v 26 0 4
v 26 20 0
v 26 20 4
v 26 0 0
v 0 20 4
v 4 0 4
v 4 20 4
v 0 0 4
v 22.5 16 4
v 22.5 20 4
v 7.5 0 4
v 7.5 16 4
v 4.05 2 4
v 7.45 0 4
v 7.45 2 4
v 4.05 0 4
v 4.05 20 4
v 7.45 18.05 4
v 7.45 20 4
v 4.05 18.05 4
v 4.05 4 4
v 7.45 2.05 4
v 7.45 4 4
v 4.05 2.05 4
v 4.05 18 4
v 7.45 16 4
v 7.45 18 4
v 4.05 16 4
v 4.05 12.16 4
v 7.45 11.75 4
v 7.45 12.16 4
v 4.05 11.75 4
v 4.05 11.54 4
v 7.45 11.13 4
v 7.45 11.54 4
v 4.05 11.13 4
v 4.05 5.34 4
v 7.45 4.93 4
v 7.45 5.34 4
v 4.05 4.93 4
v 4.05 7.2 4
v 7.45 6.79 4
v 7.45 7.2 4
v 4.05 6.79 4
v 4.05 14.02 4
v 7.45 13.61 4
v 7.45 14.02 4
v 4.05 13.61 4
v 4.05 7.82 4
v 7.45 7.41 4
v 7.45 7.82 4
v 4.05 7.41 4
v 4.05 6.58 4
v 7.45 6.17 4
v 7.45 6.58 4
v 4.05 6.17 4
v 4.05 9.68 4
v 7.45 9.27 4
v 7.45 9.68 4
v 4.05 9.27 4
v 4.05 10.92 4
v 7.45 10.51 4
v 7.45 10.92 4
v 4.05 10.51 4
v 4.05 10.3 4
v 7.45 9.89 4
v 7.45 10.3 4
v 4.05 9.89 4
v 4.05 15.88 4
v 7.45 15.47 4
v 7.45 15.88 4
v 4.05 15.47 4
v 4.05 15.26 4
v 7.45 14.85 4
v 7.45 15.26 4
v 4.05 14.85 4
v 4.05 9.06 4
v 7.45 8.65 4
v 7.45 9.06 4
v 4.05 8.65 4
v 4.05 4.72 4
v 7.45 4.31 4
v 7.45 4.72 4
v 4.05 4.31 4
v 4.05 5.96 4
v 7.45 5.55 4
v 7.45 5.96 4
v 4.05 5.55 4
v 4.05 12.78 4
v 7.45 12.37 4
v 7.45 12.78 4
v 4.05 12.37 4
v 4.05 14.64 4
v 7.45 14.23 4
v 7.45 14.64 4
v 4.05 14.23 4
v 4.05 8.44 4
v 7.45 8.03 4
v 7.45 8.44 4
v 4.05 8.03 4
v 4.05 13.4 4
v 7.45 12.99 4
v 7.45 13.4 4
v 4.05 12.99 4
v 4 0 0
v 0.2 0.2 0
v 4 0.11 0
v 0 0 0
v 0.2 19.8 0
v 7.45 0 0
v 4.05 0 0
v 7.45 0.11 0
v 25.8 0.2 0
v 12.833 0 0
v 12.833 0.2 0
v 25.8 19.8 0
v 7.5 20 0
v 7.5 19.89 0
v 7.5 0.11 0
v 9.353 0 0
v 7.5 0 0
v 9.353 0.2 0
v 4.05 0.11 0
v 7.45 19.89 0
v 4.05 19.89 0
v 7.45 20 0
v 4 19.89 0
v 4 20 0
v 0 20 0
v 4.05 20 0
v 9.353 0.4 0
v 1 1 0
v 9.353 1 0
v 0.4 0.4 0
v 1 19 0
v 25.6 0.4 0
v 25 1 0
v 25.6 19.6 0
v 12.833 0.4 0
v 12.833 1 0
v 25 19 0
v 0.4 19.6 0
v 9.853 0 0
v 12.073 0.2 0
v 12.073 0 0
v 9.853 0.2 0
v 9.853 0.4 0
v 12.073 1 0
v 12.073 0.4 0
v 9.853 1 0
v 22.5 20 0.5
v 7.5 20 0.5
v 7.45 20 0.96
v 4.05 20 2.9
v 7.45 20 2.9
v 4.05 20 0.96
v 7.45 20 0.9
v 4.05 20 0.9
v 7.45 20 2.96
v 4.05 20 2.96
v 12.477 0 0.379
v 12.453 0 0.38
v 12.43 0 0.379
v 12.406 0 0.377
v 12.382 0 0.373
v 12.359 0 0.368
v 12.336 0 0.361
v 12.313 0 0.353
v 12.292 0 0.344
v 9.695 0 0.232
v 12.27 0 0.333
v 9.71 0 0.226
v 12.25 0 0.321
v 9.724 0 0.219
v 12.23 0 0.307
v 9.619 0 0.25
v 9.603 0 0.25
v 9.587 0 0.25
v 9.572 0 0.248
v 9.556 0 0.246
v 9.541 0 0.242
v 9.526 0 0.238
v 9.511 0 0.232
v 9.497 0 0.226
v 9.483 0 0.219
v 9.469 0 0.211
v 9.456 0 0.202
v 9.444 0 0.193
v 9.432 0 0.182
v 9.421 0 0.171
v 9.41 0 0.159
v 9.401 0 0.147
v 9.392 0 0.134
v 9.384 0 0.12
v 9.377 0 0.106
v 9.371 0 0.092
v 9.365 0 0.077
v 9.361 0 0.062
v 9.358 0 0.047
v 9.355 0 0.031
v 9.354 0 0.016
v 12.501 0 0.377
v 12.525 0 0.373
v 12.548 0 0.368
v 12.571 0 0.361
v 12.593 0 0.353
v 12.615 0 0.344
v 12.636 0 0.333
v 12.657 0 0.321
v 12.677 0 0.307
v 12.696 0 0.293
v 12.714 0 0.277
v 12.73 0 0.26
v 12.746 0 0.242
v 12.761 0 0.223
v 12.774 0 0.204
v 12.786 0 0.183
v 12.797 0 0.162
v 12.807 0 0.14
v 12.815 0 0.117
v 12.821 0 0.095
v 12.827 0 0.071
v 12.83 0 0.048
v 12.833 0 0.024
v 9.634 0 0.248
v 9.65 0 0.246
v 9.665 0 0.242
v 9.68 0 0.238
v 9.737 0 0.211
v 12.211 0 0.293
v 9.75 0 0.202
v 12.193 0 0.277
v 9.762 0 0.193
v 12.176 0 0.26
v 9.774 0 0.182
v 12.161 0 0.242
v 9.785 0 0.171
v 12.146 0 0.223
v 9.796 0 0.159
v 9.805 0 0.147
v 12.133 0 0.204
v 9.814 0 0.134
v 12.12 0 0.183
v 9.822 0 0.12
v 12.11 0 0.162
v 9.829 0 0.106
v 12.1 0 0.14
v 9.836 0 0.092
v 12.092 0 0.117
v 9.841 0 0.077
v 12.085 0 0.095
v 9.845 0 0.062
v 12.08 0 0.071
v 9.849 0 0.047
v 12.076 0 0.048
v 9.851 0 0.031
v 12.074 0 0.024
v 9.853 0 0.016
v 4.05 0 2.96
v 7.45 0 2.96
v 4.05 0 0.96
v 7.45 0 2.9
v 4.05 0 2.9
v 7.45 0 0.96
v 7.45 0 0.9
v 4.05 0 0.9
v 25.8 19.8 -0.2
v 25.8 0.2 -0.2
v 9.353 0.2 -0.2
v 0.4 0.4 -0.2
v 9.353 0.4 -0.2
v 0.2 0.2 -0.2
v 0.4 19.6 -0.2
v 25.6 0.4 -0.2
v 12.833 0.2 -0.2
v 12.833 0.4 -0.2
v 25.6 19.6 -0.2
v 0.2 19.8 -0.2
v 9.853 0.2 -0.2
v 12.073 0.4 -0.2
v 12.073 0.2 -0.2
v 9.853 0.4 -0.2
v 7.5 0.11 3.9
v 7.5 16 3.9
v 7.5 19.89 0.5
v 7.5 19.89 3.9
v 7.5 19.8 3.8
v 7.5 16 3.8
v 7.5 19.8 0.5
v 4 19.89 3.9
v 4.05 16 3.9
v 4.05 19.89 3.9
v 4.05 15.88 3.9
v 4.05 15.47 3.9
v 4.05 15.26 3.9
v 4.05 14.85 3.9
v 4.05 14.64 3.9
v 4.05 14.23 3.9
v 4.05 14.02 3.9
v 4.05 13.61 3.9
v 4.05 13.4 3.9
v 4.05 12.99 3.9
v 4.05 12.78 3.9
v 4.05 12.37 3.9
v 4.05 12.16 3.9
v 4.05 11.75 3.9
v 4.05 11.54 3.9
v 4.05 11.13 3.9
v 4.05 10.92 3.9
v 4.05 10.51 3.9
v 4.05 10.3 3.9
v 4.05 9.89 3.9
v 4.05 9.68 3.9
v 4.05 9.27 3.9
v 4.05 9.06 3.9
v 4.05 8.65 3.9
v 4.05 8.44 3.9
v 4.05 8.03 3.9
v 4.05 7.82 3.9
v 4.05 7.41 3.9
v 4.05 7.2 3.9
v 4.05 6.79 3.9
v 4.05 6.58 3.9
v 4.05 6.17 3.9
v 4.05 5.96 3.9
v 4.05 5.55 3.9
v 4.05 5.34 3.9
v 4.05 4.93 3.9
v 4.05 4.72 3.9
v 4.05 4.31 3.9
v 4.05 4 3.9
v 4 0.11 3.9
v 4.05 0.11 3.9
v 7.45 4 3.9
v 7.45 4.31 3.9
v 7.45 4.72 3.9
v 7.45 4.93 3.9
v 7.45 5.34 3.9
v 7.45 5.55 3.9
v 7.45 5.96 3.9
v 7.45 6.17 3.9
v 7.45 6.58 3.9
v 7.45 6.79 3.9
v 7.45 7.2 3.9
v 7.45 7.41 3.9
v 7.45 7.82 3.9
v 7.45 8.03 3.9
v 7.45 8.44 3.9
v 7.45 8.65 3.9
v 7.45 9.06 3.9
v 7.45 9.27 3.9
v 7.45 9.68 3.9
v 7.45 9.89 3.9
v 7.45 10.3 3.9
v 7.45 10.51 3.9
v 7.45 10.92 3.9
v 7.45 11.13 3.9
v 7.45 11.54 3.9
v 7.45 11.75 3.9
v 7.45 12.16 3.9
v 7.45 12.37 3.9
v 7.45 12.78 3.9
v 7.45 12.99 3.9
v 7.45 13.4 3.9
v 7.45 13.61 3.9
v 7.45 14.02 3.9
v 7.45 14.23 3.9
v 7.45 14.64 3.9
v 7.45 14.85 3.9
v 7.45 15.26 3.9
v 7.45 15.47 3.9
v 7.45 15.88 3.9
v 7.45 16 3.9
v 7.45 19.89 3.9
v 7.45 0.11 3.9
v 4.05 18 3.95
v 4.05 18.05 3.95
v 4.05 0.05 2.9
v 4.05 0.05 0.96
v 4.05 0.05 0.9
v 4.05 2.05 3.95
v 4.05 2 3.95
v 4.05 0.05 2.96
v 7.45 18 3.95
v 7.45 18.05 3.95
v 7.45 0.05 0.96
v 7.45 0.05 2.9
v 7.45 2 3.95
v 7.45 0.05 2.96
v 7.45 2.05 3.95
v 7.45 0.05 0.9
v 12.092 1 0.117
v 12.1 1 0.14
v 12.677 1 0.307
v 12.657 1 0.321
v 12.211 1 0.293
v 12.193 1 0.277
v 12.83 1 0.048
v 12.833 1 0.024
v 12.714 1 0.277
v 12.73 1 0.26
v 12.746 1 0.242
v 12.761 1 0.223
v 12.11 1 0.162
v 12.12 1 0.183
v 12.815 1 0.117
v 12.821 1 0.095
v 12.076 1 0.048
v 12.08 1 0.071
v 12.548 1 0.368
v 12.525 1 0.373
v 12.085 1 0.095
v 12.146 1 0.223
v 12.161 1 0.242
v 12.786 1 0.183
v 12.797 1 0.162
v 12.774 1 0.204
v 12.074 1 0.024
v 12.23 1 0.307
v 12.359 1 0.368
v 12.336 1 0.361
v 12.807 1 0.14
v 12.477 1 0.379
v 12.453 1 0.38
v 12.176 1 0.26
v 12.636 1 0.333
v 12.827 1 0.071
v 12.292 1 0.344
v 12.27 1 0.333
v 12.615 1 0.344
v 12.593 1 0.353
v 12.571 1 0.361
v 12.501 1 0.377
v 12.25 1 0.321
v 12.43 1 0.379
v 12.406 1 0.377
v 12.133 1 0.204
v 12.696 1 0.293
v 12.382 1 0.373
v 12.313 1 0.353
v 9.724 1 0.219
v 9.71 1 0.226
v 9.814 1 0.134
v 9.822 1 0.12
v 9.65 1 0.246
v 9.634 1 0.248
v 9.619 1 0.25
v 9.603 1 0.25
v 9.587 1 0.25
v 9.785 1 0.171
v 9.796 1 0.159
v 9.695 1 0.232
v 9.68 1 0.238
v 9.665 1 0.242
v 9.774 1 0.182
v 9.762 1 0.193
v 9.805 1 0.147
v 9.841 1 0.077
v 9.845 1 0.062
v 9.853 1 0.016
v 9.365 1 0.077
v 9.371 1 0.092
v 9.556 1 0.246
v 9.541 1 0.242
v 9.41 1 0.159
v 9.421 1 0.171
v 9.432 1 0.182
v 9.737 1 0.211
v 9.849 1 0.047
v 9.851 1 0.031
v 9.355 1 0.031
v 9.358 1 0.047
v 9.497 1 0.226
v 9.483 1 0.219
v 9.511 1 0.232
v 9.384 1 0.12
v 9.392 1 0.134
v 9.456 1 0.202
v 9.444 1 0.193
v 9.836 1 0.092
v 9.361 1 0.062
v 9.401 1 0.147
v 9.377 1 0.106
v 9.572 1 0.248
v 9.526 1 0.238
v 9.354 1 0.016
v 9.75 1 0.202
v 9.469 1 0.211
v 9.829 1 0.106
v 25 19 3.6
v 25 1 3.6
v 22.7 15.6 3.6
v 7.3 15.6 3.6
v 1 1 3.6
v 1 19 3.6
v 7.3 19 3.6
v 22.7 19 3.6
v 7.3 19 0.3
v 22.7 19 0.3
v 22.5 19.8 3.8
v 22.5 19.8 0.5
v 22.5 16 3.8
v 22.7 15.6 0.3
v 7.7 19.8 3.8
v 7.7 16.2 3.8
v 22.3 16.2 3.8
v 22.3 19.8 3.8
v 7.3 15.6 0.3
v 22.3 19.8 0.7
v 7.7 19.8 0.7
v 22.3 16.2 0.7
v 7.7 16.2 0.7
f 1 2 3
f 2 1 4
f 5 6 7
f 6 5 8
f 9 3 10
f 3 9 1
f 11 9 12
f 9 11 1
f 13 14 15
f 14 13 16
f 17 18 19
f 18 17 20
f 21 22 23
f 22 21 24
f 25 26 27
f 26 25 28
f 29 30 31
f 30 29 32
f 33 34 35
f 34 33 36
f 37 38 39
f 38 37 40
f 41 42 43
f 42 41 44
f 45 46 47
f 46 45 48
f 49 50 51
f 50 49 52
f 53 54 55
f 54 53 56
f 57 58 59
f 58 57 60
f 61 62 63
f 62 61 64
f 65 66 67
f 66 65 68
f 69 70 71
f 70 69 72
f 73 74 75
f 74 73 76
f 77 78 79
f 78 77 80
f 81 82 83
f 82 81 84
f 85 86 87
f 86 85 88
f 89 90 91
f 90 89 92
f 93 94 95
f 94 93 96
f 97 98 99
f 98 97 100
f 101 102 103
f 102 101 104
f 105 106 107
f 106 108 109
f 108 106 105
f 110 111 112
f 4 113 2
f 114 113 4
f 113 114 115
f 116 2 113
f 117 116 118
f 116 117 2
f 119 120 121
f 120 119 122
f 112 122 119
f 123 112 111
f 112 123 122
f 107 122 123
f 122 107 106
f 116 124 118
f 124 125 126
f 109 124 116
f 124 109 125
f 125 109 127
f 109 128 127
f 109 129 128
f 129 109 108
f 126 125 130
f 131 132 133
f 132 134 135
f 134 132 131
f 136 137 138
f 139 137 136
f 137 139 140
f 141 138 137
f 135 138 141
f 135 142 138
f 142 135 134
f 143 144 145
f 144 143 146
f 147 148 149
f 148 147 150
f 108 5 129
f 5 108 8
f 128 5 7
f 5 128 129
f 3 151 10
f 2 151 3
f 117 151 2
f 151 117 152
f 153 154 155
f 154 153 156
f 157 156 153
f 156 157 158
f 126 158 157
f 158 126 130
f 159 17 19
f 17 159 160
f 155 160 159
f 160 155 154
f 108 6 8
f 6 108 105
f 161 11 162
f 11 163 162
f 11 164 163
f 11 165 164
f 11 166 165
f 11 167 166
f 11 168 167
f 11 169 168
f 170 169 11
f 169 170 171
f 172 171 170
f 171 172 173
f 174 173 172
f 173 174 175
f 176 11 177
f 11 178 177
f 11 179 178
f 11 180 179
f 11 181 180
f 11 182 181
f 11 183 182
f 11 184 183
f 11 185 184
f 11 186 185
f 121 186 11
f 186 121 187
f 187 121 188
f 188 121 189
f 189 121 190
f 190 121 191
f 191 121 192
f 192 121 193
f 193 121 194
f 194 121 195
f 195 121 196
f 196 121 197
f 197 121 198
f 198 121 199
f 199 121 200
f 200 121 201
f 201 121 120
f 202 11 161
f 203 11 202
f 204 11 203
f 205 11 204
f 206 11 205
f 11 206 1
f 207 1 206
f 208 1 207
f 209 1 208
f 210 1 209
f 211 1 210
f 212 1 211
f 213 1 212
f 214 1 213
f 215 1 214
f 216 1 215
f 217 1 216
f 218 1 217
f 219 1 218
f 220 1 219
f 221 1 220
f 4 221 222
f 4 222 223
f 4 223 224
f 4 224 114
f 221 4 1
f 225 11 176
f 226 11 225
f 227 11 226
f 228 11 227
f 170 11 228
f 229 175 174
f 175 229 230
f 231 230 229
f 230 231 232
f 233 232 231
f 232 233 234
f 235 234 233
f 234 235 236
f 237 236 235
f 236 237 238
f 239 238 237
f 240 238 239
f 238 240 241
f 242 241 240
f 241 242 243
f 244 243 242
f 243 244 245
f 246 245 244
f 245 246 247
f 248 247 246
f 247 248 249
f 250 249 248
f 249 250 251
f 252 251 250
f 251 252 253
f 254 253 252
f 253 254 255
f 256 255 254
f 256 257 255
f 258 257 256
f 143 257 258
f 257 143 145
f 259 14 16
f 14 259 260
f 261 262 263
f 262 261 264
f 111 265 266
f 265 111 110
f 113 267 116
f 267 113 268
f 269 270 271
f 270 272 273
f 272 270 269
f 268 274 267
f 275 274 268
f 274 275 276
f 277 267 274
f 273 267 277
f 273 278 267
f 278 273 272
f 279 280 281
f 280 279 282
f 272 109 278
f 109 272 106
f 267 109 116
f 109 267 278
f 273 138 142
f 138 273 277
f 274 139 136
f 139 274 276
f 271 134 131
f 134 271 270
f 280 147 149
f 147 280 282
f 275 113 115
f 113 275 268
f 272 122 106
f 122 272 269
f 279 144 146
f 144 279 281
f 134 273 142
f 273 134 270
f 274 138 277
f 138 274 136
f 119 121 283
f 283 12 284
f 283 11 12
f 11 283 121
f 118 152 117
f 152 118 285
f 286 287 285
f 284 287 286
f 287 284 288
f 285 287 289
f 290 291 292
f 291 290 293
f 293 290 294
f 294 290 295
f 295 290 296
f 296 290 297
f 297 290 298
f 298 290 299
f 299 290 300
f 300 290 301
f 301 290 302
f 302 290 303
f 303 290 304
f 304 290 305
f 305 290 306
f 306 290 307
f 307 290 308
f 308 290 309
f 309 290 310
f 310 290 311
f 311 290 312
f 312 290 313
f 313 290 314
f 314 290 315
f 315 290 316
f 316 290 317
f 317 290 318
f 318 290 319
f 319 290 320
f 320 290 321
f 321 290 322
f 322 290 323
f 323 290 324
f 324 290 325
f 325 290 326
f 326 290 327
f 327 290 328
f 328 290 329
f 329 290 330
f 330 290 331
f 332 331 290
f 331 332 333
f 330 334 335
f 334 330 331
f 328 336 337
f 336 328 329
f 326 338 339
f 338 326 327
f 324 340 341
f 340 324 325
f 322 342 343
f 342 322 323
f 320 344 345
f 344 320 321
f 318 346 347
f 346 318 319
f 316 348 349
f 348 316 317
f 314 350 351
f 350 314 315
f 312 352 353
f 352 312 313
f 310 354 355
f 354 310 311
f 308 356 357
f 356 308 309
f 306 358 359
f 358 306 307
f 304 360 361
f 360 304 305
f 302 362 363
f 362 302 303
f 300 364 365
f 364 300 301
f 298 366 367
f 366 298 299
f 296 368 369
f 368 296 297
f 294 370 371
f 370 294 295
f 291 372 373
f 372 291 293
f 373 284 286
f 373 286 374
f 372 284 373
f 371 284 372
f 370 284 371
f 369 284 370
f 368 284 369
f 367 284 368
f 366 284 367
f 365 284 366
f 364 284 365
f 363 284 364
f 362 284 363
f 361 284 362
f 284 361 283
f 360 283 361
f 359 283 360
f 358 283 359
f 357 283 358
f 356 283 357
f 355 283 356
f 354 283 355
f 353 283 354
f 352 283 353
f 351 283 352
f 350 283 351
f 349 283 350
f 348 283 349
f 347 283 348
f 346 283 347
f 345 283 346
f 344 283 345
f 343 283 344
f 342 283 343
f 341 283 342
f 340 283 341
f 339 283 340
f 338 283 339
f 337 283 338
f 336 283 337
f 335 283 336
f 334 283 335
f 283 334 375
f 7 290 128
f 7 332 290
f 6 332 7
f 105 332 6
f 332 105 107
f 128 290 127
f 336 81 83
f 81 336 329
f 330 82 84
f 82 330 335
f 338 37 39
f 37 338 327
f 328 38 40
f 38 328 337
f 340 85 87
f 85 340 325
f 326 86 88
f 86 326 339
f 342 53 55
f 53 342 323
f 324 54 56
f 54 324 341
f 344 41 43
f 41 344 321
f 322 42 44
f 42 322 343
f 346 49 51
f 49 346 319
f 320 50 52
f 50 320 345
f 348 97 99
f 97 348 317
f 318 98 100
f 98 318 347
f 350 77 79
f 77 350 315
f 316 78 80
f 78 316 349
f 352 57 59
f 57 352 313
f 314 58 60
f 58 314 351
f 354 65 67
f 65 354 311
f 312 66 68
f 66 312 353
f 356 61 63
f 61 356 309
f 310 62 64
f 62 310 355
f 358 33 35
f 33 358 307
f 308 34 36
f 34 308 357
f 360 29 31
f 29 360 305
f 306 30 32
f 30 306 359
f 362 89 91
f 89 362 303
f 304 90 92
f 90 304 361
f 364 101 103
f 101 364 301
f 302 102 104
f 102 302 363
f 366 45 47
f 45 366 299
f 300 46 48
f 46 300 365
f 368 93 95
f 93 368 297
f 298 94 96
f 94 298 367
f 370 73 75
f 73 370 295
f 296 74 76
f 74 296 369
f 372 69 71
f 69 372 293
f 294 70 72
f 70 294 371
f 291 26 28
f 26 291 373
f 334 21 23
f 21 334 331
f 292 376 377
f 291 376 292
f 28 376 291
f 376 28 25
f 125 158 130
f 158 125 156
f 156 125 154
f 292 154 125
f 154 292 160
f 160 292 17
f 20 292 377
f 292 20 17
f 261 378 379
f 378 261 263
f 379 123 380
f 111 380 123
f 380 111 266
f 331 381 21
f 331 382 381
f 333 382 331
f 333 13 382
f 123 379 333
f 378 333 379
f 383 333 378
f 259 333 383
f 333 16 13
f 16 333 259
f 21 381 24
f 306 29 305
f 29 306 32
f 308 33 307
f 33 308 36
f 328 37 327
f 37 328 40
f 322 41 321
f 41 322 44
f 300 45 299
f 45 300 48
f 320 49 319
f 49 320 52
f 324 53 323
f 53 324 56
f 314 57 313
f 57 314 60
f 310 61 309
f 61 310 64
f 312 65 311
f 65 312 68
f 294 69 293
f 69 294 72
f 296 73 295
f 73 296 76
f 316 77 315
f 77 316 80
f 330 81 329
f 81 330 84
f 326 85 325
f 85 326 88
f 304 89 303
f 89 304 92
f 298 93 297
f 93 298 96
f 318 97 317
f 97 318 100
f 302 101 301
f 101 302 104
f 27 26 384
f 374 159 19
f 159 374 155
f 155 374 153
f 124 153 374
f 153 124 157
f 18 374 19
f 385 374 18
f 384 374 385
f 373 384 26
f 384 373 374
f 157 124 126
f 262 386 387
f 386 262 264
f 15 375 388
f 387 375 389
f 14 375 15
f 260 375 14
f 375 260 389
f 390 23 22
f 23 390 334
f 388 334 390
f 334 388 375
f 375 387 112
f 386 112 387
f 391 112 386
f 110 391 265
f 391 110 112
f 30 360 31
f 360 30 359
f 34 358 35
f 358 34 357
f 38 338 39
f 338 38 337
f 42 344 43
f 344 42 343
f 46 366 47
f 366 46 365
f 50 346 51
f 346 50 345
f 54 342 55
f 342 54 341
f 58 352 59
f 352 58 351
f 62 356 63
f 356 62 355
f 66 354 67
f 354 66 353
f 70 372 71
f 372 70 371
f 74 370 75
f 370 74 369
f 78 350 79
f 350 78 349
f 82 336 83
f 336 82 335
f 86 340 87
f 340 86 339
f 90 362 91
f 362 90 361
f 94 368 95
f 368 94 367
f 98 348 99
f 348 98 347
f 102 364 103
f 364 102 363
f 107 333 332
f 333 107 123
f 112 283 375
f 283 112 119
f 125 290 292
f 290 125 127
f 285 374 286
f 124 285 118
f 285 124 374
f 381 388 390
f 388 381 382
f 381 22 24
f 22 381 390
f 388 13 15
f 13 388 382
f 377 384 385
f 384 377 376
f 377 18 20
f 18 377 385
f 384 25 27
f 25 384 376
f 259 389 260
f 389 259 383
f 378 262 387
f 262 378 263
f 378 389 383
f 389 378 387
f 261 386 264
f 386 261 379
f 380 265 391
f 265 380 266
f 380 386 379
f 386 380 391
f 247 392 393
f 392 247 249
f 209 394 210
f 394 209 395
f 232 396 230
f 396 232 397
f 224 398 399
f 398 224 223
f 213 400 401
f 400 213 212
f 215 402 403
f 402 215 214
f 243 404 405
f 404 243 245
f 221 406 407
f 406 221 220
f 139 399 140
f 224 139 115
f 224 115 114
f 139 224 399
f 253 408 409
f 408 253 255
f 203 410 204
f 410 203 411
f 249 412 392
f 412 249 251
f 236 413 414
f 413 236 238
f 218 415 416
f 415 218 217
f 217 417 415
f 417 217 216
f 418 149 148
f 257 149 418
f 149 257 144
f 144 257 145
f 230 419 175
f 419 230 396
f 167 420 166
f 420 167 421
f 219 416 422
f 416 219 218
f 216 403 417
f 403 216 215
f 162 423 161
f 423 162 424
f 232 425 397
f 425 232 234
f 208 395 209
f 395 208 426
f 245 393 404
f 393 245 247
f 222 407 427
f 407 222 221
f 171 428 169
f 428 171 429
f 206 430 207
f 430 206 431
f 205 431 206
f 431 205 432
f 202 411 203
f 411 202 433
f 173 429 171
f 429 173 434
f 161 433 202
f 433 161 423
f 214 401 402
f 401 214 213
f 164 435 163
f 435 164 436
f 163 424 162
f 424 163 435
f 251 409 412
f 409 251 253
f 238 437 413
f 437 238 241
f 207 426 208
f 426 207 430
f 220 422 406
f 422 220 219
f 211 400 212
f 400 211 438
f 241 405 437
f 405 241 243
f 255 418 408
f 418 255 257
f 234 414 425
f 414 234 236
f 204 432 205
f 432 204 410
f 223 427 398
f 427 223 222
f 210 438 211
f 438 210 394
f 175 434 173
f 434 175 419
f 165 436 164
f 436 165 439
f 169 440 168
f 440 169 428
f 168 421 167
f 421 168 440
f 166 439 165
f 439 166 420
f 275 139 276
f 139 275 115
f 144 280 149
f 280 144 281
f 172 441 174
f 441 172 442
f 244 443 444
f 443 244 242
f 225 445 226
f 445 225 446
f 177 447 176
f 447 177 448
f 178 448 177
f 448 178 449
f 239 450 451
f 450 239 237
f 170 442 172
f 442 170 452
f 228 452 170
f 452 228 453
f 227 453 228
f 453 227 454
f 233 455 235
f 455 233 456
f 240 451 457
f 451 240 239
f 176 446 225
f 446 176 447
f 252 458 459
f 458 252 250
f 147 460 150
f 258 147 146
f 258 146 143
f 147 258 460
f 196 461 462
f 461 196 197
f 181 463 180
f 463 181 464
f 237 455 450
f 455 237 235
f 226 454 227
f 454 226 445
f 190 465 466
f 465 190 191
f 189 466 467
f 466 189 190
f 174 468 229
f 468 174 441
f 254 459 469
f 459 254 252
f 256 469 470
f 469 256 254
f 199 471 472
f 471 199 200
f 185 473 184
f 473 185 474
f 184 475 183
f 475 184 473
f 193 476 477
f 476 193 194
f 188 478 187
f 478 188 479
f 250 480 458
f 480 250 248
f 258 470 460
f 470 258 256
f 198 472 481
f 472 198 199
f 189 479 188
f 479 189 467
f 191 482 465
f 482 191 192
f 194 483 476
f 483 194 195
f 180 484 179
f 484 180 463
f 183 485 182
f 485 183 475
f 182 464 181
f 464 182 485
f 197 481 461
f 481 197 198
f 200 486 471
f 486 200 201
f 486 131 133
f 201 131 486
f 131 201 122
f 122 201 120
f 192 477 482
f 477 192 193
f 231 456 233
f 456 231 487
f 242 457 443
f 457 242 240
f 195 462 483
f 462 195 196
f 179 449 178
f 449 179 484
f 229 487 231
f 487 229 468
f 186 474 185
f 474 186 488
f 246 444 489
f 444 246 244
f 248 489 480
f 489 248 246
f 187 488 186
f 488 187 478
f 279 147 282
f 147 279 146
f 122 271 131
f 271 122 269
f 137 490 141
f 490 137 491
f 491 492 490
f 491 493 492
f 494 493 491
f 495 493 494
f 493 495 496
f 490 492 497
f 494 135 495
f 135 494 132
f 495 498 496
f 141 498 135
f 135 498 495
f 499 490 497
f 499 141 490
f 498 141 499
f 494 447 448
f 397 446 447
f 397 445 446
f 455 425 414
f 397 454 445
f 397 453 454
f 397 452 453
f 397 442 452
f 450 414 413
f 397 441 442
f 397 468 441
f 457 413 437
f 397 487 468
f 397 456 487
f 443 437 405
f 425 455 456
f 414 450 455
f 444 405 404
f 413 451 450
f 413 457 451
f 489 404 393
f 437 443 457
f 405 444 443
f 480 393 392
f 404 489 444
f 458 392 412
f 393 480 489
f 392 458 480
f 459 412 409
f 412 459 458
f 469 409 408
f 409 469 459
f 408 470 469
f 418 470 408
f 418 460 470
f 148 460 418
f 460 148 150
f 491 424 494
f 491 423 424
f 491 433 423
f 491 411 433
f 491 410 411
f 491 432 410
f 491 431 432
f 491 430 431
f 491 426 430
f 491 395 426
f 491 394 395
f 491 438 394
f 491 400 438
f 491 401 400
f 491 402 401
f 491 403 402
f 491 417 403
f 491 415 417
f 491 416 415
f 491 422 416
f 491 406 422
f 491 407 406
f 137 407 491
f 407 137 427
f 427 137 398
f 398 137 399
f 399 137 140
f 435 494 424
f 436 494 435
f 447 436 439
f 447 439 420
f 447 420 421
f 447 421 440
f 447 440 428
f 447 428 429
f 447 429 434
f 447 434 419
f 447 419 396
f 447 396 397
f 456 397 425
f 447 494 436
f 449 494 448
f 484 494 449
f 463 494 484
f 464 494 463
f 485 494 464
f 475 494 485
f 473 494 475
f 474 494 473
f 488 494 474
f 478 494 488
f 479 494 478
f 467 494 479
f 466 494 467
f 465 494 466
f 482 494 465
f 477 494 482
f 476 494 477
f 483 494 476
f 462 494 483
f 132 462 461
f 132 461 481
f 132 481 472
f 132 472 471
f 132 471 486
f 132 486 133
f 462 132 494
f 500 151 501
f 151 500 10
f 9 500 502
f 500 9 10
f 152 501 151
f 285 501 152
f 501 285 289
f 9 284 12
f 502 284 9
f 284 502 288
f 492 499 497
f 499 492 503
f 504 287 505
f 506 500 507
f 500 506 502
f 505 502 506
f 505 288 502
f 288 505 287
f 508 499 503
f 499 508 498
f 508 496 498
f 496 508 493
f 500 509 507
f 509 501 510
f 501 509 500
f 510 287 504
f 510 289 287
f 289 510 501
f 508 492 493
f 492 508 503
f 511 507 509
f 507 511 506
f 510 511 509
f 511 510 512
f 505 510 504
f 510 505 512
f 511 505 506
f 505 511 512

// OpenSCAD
$scale = 0.7508;

module nes_top(){
    difference(){
        union(){
            cube([26,20,4]);
            translate([0.2,19.6,-0.2]){
                cube([25.6,0.2,0.4]);
            }
            translate([0.2,0.2,-0.2]){
                cube([25.6,0.2,0.4]);
            }
            translate([0.2,0.4,-0.2]){
                cube([0.2,19.2,0.4]);
            }
            translate([25.6,0.4,-0.2]){
                cube([0.2,19.2,0.4]);
            }
        }
        translate([1,1,0]){
            cube([24,18,3.6]);
        }
        //translate([0.4,0.4,0]){
        //    cube([25.2,19.2,0.2]);
        //}
        translate([7.5,16,0.5]){
            cube([15,4,3.5]);
        }
        translate([4,4,3.9]){
            difference(){
                cube([3.5,12,0.11]);
                for(x = [0.31:0.62:12]){
                    translate([0,x,0]){
                        cube([3.5,0.41,0.11]);
                    }
                }
            }
            translate([0,-4,0]) cube([0.05,20,0.11]);
            translate([3.45,-4,0]) cube([0.05,20,0.11]);
            
            translate([0,-4,-4]) cube([0.05,0.11,4]);
            translate([3.45,-4,-4]) cube([0.05,0.11,4]);
            
            translate([0,15.89,-4]) cube([0.05,0.11,4]);
            translate([3.45,15.89,-4]) cube([0.05,0.11,4]);
            
            translate([0,-2,0.05]) cube([3.5,0.05,0.06]);
            translate([0,14,0.05]) cube([3.5,0.05,0.06]);
            
            translate([0,-4,-1]) cube([3.5,0.05,0.06]);
            translate([0,16,-1]) cube([3.5,0.05,0.06]);
            
            translate([0,-4,-3]) cube([3.5,0.05,0.06]);
            translate([0,16,-3]) cube([3.5,0.05,0.06]);
        }
        translate([(6.5+2.85)/$scale,0,0]){
            rotate([-90,0,0]){
                cylinder(h=6, r=0.380, $fn=100);
            }
            translate([-0.38,0,-0.5]){
                cube([0.76,6,0.5]);
            }
        }
        translate([(6.5+0.71)/$scale,0,0]){
            rotate([-90,0,0]){
                cylinder(h=4, r=0.25, $fn=100);
            }
            translate([-0.25,0,-0.5]){
                cube([0.5,4,0.5]);
            }
        }
    }
    
    translate([7.3,15.6,0.5]){
        difference(){
            translate([0,0,-0.2]){
                cube([15.4,4.2,3.5]);
            }
            translate([0.4,0.6,0.2]){
                cube([14.6,4,3.1]);
            }
        }
    }
    
}

nes_top();
